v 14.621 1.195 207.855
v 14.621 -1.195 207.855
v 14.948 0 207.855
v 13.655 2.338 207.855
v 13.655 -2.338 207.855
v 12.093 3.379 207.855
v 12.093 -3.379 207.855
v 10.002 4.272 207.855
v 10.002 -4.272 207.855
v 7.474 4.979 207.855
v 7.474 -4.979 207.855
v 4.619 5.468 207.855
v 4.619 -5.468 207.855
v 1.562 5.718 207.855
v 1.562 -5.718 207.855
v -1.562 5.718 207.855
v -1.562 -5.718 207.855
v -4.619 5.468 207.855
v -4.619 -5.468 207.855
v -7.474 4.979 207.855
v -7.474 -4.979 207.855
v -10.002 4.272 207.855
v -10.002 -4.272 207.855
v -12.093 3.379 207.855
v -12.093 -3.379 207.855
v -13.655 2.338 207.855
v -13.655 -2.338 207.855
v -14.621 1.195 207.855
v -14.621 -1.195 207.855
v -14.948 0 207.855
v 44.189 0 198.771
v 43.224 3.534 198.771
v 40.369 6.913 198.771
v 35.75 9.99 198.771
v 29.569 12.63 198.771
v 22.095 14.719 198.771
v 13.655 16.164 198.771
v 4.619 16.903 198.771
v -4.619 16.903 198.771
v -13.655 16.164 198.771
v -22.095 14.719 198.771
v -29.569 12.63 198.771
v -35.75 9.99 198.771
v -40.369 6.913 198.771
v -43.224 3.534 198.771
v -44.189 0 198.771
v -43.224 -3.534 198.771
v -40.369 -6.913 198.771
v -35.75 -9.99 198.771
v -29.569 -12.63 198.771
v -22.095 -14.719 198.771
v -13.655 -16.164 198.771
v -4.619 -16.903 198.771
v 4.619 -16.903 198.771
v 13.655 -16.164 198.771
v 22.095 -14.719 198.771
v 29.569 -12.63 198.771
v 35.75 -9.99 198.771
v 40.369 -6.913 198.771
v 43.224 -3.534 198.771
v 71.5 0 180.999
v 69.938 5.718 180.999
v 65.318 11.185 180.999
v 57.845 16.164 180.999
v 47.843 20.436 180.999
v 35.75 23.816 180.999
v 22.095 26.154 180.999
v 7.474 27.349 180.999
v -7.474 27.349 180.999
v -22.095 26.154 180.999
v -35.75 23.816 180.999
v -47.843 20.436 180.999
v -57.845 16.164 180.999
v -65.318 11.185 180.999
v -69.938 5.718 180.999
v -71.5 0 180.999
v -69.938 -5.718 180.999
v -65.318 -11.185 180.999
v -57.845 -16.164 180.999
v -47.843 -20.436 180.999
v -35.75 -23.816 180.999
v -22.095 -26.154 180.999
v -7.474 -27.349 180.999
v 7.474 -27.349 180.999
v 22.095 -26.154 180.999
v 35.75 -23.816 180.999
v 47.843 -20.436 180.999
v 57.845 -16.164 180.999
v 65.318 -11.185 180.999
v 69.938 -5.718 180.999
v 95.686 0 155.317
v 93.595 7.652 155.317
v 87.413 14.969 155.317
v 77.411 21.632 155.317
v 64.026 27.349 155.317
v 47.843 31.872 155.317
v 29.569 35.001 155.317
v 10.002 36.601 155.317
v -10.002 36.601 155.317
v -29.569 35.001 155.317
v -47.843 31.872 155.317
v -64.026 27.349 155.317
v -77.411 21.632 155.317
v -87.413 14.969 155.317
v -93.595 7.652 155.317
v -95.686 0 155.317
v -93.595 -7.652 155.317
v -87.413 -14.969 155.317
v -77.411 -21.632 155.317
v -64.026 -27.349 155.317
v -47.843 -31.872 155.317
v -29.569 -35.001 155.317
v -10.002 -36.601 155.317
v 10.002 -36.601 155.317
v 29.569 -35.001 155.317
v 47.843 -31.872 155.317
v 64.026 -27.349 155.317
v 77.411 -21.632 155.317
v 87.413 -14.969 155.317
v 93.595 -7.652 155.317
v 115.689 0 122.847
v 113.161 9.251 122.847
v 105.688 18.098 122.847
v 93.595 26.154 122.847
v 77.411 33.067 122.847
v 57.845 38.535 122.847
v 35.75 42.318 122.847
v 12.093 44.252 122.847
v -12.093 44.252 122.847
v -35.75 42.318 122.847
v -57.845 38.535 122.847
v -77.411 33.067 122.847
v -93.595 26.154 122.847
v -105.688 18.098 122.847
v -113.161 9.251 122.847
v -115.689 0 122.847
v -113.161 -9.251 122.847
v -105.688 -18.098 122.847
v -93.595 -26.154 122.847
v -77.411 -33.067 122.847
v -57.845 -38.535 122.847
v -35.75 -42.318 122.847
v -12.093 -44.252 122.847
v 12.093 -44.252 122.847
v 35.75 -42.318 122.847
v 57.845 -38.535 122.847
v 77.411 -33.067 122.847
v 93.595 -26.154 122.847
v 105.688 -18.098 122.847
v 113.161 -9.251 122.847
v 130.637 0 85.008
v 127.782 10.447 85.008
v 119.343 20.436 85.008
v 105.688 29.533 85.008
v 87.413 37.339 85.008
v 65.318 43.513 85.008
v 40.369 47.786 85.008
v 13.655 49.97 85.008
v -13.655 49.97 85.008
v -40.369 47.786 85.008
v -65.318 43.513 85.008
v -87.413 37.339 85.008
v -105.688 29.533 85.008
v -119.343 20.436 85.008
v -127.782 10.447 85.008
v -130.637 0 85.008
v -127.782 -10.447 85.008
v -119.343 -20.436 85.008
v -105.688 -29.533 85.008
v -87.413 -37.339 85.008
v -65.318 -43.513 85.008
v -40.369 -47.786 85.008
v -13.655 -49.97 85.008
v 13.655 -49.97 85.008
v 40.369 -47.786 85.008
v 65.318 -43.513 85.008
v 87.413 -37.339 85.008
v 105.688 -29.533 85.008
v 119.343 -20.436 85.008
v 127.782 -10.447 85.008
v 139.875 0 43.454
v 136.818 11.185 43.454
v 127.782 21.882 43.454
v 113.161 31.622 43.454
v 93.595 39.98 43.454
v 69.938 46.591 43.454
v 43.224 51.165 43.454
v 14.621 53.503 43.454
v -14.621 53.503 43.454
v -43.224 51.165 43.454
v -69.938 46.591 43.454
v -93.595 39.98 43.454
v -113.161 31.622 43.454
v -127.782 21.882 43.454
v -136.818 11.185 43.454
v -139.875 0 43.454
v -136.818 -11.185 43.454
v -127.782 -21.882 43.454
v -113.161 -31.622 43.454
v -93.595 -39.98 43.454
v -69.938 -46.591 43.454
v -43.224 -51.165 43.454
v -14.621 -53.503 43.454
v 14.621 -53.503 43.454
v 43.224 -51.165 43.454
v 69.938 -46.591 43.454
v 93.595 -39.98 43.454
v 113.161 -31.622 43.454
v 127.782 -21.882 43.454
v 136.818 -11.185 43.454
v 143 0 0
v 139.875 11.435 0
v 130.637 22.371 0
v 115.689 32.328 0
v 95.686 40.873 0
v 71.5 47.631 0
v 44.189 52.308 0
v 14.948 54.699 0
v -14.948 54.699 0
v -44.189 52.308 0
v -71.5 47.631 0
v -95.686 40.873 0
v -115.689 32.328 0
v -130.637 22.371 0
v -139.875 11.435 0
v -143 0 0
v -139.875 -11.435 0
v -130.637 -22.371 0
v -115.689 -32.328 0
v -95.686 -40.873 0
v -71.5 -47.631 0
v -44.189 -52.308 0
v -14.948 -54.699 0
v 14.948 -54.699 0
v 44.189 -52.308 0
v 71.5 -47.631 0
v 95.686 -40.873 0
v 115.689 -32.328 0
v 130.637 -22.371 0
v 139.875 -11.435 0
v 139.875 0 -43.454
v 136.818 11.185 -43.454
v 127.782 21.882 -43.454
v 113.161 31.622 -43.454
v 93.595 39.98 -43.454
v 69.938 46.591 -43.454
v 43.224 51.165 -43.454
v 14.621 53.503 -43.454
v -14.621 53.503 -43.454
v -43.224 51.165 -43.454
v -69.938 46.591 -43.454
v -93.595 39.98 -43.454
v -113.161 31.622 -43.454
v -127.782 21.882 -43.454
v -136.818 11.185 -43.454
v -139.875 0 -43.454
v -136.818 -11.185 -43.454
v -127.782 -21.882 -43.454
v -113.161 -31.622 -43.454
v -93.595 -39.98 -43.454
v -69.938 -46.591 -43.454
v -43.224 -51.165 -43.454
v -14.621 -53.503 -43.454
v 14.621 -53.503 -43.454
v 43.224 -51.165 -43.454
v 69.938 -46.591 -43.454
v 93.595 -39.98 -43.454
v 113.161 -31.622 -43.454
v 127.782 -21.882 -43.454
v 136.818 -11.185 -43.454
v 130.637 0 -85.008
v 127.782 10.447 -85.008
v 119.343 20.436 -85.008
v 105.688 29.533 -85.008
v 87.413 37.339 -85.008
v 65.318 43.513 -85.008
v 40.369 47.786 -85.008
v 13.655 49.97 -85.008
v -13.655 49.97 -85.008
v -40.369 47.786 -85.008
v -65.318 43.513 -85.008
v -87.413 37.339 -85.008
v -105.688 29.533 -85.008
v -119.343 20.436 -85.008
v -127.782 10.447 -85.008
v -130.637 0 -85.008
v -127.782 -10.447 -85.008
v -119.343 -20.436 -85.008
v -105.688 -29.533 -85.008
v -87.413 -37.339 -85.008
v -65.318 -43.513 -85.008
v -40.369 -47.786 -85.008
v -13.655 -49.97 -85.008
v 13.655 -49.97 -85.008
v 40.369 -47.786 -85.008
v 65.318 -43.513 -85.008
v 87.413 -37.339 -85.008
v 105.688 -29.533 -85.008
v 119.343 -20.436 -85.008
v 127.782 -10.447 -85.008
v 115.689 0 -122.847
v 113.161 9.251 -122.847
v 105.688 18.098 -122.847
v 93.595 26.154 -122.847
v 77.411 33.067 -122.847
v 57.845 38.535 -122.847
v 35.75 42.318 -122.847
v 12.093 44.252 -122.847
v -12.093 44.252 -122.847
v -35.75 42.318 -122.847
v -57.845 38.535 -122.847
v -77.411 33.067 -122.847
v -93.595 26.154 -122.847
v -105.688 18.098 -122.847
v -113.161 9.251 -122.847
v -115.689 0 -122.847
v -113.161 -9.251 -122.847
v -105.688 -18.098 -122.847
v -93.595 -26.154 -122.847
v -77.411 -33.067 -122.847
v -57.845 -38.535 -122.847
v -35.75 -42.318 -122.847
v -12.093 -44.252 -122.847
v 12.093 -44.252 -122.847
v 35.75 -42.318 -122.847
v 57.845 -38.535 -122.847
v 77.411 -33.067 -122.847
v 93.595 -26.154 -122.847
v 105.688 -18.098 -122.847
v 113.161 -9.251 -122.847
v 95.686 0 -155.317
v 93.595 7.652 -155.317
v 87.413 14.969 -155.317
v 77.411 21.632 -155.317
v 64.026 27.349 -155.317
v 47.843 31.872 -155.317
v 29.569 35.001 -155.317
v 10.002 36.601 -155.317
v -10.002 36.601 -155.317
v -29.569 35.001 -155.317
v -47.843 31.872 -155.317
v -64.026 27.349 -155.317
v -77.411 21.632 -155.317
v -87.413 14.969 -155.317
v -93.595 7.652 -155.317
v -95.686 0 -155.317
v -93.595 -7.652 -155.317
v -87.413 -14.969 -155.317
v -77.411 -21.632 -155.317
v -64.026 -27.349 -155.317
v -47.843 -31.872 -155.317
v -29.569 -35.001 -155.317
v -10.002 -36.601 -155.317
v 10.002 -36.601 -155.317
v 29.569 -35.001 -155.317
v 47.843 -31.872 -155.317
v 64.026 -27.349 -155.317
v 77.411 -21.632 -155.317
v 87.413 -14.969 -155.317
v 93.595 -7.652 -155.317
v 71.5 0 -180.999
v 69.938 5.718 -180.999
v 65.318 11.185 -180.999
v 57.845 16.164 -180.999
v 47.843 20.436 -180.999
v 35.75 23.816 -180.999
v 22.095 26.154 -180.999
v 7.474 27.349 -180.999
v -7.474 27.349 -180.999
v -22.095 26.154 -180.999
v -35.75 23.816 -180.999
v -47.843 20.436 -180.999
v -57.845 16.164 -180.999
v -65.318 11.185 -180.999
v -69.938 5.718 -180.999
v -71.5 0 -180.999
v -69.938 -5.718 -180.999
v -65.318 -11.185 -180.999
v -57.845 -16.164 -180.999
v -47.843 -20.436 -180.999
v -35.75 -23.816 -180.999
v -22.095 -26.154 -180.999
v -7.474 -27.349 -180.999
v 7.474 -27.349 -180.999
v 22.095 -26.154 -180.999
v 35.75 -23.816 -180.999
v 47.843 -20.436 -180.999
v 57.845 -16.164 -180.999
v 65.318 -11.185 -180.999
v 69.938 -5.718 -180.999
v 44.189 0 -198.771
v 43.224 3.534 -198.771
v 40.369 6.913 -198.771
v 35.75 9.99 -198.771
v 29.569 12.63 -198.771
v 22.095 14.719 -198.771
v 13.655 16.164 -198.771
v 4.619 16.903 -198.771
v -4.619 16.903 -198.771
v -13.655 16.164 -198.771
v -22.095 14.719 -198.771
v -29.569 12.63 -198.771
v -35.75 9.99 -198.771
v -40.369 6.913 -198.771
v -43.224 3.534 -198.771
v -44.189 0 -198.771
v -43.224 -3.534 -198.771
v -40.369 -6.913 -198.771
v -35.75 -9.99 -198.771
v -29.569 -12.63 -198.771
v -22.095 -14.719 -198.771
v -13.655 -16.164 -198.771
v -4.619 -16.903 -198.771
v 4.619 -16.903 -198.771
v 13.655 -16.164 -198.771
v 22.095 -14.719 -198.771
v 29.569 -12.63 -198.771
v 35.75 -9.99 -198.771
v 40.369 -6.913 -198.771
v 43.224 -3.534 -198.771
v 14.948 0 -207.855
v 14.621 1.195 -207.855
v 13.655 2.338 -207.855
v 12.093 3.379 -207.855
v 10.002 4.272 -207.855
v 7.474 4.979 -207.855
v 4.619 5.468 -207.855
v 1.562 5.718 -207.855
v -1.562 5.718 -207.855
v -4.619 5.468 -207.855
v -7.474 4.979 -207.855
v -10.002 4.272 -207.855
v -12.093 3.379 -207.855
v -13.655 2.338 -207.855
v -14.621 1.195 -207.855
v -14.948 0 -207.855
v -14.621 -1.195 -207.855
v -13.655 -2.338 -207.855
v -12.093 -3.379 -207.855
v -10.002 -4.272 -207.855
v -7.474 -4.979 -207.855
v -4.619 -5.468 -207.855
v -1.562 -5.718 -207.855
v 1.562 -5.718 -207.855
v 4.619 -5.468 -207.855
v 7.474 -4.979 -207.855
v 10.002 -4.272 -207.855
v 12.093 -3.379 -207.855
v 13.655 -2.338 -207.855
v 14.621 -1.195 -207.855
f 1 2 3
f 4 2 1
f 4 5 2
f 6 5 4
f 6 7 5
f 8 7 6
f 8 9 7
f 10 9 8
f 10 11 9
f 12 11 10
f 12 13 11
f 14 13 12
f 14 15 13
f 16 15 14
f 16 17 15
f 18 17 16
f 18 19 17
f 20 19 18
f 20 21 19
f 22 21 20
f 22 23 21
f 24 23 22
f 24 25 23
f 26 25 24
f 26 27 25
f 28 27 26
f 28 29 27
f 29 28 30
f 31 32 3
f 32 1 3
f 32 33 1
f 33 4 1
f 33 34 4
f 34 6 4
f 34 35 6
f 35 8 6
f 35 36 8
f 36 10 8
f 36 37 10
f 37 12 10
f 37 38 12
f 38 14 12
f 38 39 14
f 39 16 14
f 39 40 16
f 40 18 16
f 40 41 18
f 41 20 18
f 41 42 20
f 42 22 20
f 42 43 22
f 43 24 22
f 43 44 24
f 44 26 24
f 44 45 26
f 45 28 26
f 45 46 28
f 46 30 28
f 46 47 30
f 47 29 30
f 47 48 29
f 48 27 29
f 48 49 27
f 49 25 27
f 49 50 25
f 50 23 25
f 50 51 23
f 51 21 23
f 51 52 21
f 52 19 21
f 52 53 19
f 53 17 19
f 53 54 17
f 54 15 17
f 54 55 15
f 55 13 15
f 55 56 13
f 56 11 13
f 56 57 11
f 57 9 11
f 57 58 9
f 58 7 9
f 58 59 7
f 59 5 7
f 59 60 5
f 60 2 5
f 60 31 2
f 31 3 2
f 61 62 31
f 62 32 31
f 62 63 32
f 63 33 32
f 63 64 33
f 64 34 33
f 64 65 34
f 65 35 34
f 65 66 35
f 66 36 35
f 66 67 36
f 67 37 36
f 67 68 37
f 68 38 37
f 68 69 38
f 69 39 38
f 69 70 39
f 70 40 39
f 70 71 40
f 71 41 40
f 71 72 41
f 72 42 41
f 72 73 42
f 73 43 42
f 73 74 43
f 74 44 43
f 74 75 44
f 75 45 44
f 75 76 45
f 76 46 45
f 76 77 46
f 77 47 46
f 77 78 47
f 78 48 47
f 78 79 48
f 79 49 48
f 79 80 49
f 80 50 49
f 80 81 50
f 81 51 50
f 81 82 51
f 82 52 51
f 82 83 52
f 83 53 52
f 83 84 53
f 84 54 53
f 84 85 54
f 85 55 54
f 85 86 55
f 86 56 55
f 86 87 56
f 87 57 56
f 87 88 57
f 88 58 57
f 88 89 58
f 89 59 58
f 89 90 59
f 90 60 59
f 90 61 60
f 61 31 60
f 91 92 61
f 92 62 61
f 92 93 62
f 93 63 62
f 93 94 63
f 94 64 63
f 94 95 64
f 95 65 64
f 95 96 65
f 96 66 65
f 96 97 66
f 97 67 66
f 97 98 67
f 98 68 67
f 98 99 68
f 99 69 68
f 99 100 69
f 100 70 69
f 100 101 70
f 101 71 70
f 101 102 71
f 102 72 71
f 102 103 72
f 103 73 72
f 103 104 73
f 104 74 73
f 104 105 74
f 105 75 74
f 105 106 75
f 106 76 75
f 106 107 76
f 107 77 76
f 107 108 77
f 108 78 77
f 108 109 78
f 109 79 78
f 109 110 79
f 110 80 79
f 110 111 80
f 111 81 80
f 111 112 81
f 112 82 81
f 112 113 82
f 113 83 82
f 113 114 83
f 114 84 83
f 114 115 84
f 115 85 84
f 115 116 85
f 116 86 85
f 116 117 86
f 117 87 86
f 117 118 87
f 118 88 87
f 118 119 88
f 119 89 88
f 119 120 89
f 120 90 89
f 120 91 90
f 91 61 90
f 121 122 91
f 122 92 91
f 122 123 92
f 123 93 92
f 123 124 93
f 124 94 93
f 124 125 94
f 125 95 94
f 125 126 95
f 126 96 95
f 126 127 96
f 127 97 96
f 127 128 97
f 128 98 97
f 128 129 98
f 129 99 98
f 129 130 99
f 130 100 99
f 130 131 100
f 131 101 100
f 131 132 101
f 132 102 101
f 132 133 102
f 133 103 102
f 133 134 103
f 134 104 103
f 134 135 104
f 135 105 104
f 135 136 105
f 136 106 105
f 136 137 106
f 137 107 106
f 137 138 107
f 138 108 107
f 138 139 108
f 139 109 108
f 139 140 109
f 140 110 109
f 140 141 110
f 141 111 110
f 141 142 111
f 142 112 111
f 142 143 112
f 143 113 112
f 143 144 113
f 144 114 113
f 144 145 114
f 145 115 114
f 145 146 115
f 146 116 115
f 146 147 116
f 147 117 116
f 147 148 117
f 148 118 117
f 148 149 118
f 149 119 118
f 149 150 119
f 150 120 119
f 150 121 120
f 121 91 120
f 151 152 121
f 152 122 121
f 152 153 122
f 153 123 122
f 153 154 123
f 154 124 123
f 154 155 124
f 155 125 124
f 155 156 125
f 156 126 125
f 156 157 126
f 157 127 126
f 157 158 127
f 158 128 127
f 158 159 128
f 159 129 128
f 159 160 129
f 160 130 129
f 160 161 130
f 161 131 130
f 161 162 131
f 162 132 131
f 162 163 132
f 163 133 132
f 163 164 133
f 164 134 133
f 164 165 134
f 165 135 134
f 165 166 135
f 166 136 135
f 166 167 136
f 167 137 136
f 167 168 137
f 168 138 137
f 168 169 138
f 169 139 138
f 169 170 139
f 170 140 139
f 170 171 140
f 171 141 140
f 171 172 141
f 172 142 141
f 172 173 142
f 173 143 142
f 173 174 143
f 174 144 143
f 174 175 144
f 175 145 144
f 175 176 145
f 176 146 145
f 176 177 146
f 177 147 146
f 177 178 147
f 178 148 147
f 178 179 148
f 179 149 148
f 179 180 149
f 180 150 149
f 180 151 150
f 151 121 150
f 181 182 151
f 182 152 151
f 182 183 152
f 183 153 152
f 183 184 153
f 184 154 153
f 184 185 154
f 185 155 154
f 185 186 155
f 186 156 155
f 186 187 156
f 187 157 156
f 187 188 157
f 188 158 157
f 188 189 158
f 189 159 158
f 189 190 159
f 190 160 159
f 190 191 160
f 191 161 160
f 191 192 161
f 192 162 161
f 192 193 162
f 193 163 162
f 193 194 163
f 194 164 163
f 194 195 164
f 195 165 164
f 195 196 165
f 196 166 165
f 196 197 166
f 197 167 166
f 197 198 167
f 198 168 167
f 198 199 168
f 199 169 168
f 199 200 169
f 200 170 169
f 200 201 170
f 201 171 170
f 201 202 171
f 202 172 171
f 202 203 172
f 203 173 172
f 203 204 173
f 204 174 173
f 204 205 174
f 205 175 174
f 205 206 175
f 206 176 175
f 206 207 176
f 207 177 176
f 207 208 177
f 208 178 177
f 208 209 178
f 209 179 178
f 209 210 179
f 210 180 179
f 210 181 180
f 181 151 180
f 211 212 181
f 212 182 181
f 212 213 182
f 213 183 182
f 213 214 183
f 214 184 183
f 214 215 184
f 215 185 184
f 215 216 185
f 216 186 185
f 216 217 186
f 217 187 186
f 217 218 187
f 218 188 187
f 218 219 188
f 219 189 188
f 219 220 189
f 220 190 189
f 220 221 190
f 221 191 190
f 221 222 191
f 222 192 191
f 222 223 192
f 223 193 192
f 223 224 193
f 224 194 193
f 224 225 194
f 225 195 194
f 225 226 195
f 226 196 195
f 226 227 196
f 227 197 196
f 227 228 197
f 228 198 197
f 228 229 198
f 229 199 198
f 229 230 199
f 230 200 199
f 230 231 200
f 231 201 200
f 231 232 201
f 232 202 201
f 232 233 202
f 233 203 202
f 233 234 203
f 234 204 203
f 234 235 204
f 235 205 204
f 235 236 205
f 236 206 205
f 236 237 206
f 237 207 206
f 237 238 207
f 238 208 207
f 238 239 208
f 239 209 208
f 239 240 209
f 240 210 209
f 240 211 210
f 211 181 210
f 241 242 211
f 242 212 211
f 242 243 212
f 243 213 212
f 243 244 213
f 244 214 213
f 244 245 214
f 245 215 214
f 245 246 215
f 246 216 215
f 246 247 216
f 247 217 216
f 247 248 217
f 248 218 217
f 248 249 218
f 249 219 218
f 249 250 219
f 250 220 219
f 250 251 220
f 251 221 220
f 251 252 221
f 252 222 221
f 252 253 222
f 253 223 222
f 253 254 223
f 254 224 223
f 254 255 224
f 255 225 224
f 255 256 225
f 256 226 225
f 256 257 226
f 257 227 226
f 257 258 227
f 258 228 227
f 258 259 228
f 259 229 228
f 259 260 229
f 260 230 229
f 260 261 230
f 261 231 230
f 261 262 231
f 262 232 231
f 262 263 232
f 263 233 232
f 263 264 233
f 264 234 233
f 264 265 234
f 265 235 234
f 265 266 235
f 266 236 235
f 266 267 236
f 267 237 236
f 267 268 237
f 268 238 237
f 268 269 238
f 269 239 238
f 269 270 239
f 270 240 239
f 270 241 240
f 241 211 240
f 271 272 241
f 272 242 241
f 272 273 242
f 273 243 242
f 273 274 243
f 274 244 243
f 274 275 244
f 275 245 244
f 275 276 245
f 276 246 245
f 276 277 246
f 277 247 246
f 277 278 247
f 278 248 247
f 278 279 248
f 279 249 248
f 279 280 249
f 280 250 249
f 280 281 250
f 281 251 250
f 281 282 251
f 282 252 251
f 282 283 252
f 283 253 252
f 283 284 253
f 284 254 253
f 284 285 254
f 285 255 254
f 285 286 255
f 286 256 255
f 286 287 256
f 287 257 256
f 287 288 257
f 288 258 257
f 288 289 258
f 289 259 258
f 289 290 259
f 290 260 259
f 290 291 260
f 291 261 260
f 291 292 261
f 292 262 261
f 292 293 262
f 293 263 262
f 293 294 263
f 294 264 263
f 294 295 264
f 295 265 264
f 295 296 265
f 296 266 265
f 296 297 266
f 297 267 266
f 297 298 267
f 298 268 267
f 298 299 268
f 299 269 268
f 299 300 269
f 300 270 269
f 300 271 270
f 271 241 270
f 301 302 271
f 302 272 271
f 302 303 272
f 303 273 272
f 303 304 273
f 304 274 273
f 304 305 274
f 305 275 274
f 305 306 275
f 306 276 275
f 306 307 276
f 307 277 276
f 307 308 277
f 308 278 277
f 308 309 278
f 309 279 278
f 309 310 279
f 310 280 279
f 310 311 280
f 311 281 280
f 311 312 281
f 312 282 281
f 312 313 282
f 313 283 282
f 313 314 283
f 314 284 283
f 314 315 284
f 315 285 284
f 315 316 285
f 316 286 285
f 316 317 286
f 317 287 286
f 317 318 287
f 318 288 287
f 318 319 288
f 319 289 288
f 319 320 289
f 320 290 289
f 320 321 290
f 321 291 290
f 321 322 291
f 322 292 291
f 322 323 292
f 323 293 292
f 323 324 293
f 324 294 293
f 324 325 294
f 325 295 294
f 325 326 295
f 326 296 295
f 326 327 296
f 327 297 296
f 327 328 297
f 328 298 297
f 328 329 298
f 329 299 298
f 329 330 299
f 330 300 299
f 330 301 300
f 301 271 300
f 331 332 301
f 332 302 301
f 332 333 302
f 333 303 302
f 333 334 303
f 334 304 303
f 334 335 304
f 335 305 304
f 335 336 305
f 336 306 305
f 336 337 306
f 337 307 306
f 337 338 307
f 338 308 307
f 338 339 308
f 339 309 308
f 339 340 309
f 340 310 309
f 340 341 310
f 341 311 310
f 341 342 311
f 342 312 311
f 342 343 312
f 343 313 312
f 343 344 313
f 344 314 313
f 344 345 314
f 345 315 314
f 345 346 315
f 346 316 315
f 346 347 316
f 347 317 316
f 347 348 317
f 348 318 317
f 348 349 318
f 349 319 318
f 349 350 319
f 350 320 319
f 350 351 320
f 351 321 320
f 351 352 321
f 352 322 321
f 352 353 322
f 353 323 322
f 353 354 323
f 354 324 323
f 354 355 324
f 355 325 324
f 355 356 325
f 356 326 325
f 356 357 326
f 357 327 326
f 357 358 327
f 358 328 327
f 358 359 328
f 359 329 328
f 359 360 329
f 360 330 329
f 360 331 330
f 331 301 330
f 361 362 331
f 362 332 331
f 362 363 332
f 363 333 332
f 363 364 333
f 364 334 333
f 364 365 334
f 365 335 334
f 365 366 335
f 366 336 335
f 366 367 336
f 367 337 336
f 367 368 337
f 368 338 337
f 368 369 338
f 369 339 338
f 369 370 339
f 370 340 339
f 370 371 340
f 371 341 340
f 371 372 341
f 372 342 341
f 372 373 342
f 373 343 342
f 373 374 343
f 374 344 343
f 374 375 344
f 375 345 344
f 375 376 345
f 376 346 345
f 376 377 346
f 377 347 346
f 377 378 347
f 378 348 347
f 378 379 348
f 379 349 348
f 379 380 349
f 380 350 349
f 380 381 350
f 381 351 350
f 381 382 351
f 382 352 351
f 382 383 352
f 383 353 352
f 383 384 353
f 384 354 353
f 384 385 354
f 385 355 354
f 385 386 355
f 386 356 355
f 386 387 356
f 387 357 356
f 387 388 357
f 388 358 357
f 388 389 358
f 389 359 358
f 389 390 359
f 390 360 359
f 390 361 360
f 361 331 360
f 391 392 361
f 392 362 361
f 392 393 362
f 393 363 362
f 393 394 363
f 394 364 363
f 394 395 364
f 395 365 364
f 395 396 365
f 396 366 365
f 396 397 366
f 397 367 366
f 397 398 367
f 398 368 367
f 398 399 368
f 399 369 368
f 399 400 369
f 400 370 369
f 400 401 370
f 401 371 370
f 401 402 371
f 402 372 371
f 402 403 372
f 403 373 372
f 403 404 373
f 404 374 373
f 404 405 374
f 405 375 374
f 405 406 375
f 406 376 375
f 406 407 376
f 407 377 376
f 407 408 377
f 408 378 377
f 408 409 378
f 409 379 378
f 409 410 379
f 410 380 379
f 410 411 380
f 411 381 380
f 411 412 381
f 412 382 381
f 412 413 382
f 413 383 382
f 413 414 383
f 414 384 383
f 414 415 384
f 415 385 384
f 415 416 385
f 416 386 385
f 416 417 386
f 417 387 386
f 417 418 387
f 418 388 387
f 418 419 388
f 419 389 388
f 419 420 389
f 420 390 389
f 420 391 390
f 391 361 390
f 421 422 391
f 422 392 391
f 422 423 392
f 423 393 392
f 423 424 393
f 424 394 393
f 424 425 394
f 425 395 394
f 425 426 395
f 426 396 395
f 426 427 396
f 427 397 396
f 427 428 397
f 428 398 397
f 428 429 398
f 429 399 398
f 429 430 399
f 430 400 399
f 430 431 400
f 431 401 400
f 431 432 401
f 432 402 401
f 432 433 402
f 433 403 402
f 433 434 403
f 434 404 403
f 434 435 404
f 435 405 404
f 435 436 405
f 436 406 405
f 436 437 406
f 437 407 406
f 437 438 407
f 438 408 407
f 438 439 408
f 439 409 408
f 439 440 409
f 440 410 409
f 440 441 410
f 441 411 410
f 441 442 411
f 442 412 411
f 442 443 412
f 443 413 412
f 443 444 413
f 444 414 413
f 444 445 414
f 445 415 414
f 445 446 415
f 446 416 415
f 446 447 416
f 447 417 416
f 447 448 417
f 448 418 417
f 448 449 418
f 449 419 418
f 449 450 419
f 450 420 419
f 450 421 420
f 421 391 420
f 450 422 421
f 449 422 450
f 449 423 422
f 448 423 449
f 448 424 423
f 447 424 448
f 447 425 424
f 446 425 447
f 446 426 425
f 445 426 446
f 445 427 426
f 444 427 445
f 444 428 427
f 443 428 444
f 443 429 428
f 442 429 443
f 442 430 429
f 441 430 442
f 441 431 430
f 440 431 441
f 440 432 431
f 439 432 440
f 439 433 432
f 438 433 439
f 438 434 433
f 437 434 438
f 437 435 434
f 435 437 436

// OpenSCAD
// Generated by SolidPython 1.0.1 on 2020-07-29 00:46:50


scale(v = [13, 5, 19]) {
	sphere(r = 11);
}
/***********************************************
*********      SolidPython code:      **********
************************************************
 
# import packages: SolidPython
from solid import *
from solid.utils import *
from itertools import chain, combinations, permutations


class Resize:

    def __init__(self, scad_file):
        self.scad_file = scad_file
        #self.scad_file = import_scad(scad_file)
        # cone/cylinder param:
        self.r1 = 0
        self.r2 = 0
        self.h = 0
        # rectangular prism param:
        self.w = 0
        self.l = 0
        # ellipse param:
        self.r = 0

    # import OpenScad code (file name corresponds to shape)


    # classify shape + parameters
    def assign(self, param1, param2, param3):
        if self.scad_file == 'cone.scad':
            self.r1 = param1
            self.r2 = param2
            self.h = param3
        elif self.scad_file == 'cylinder.scad':
            self.r1 = param1
            self.r2 = param2
            self.h = param3
        elif self.scad_file == 'rectangularPrism.scad':
            self.h = param1
            self.l = param2
            self.w = param3
        else:
            self.r = param1
            self.h = param2

    # resize parameters
    def iterate(self):
        x = range(3, 20, 2)
        i = 1
        if self.scad_file == 'cone.scad':
            tempList = list(permutations(x, 2))
            for temp in tempList:
                param1 = temp[0]
                param2 = temp[1]
                filepath = 'produced_scad_files/' + 'cone' + str(param1) + '_' + str(param2) + '_' + '.scad'
                scad_render_to_file(cylinder(h=param1, r1=param2, r2=0), filepath)

        elif self.scad_file == 'cylinder.scad':
            tempList = list(permutations(x, 3))
            for temp in tempList:
                param1 = temp[0]
                param2 = temp[1]
                filepath = 'produced_scad_files/' + 'cylinder' + str(param1) + '_' + str(param2) + '_' + '.scad'
                scad_render_to_file(cylinder(h=param1, r1=param2, r2=param2), filepath)

        elif self.scad_file == 'rectangularPrism.scad':
            tempList = list(permutations(x, 3))
            for temp in tempList:
                param1 = temp[0]
                param2 = temp[1]
                param3 = temp[2]
                filepath = 'produced_scad_files/' + 'rectangularPrism' + str(param1) + '_' + str(param2) + '_' + str(
                    param3) + '.scad'
                scad_render_to_file(cube(size=(param1, param2, param3)), filepath)

        elif self.scad_file == 'ellipse.scad':
            tempList = list(permutations(x, 4))
            for temp in tempList:
                param1 = temp[0]
                param2 = temp[1]
                param3 = temp[2]
                param4 = temp[3]
                filepath = 'produced_scad_files/' + 'ellipse' + str(param1) + '_' + str(param2) + '_' + str(param3) + '_' + str(param4) + '.scad'
                scad_render_to_file(scale([param1, param2, param3])(sphere(r=param4)), filepath)

    def render_to_scadfile(self):
        scad_render_to_file(scad, 'example.scad') 
 
************************************************/
